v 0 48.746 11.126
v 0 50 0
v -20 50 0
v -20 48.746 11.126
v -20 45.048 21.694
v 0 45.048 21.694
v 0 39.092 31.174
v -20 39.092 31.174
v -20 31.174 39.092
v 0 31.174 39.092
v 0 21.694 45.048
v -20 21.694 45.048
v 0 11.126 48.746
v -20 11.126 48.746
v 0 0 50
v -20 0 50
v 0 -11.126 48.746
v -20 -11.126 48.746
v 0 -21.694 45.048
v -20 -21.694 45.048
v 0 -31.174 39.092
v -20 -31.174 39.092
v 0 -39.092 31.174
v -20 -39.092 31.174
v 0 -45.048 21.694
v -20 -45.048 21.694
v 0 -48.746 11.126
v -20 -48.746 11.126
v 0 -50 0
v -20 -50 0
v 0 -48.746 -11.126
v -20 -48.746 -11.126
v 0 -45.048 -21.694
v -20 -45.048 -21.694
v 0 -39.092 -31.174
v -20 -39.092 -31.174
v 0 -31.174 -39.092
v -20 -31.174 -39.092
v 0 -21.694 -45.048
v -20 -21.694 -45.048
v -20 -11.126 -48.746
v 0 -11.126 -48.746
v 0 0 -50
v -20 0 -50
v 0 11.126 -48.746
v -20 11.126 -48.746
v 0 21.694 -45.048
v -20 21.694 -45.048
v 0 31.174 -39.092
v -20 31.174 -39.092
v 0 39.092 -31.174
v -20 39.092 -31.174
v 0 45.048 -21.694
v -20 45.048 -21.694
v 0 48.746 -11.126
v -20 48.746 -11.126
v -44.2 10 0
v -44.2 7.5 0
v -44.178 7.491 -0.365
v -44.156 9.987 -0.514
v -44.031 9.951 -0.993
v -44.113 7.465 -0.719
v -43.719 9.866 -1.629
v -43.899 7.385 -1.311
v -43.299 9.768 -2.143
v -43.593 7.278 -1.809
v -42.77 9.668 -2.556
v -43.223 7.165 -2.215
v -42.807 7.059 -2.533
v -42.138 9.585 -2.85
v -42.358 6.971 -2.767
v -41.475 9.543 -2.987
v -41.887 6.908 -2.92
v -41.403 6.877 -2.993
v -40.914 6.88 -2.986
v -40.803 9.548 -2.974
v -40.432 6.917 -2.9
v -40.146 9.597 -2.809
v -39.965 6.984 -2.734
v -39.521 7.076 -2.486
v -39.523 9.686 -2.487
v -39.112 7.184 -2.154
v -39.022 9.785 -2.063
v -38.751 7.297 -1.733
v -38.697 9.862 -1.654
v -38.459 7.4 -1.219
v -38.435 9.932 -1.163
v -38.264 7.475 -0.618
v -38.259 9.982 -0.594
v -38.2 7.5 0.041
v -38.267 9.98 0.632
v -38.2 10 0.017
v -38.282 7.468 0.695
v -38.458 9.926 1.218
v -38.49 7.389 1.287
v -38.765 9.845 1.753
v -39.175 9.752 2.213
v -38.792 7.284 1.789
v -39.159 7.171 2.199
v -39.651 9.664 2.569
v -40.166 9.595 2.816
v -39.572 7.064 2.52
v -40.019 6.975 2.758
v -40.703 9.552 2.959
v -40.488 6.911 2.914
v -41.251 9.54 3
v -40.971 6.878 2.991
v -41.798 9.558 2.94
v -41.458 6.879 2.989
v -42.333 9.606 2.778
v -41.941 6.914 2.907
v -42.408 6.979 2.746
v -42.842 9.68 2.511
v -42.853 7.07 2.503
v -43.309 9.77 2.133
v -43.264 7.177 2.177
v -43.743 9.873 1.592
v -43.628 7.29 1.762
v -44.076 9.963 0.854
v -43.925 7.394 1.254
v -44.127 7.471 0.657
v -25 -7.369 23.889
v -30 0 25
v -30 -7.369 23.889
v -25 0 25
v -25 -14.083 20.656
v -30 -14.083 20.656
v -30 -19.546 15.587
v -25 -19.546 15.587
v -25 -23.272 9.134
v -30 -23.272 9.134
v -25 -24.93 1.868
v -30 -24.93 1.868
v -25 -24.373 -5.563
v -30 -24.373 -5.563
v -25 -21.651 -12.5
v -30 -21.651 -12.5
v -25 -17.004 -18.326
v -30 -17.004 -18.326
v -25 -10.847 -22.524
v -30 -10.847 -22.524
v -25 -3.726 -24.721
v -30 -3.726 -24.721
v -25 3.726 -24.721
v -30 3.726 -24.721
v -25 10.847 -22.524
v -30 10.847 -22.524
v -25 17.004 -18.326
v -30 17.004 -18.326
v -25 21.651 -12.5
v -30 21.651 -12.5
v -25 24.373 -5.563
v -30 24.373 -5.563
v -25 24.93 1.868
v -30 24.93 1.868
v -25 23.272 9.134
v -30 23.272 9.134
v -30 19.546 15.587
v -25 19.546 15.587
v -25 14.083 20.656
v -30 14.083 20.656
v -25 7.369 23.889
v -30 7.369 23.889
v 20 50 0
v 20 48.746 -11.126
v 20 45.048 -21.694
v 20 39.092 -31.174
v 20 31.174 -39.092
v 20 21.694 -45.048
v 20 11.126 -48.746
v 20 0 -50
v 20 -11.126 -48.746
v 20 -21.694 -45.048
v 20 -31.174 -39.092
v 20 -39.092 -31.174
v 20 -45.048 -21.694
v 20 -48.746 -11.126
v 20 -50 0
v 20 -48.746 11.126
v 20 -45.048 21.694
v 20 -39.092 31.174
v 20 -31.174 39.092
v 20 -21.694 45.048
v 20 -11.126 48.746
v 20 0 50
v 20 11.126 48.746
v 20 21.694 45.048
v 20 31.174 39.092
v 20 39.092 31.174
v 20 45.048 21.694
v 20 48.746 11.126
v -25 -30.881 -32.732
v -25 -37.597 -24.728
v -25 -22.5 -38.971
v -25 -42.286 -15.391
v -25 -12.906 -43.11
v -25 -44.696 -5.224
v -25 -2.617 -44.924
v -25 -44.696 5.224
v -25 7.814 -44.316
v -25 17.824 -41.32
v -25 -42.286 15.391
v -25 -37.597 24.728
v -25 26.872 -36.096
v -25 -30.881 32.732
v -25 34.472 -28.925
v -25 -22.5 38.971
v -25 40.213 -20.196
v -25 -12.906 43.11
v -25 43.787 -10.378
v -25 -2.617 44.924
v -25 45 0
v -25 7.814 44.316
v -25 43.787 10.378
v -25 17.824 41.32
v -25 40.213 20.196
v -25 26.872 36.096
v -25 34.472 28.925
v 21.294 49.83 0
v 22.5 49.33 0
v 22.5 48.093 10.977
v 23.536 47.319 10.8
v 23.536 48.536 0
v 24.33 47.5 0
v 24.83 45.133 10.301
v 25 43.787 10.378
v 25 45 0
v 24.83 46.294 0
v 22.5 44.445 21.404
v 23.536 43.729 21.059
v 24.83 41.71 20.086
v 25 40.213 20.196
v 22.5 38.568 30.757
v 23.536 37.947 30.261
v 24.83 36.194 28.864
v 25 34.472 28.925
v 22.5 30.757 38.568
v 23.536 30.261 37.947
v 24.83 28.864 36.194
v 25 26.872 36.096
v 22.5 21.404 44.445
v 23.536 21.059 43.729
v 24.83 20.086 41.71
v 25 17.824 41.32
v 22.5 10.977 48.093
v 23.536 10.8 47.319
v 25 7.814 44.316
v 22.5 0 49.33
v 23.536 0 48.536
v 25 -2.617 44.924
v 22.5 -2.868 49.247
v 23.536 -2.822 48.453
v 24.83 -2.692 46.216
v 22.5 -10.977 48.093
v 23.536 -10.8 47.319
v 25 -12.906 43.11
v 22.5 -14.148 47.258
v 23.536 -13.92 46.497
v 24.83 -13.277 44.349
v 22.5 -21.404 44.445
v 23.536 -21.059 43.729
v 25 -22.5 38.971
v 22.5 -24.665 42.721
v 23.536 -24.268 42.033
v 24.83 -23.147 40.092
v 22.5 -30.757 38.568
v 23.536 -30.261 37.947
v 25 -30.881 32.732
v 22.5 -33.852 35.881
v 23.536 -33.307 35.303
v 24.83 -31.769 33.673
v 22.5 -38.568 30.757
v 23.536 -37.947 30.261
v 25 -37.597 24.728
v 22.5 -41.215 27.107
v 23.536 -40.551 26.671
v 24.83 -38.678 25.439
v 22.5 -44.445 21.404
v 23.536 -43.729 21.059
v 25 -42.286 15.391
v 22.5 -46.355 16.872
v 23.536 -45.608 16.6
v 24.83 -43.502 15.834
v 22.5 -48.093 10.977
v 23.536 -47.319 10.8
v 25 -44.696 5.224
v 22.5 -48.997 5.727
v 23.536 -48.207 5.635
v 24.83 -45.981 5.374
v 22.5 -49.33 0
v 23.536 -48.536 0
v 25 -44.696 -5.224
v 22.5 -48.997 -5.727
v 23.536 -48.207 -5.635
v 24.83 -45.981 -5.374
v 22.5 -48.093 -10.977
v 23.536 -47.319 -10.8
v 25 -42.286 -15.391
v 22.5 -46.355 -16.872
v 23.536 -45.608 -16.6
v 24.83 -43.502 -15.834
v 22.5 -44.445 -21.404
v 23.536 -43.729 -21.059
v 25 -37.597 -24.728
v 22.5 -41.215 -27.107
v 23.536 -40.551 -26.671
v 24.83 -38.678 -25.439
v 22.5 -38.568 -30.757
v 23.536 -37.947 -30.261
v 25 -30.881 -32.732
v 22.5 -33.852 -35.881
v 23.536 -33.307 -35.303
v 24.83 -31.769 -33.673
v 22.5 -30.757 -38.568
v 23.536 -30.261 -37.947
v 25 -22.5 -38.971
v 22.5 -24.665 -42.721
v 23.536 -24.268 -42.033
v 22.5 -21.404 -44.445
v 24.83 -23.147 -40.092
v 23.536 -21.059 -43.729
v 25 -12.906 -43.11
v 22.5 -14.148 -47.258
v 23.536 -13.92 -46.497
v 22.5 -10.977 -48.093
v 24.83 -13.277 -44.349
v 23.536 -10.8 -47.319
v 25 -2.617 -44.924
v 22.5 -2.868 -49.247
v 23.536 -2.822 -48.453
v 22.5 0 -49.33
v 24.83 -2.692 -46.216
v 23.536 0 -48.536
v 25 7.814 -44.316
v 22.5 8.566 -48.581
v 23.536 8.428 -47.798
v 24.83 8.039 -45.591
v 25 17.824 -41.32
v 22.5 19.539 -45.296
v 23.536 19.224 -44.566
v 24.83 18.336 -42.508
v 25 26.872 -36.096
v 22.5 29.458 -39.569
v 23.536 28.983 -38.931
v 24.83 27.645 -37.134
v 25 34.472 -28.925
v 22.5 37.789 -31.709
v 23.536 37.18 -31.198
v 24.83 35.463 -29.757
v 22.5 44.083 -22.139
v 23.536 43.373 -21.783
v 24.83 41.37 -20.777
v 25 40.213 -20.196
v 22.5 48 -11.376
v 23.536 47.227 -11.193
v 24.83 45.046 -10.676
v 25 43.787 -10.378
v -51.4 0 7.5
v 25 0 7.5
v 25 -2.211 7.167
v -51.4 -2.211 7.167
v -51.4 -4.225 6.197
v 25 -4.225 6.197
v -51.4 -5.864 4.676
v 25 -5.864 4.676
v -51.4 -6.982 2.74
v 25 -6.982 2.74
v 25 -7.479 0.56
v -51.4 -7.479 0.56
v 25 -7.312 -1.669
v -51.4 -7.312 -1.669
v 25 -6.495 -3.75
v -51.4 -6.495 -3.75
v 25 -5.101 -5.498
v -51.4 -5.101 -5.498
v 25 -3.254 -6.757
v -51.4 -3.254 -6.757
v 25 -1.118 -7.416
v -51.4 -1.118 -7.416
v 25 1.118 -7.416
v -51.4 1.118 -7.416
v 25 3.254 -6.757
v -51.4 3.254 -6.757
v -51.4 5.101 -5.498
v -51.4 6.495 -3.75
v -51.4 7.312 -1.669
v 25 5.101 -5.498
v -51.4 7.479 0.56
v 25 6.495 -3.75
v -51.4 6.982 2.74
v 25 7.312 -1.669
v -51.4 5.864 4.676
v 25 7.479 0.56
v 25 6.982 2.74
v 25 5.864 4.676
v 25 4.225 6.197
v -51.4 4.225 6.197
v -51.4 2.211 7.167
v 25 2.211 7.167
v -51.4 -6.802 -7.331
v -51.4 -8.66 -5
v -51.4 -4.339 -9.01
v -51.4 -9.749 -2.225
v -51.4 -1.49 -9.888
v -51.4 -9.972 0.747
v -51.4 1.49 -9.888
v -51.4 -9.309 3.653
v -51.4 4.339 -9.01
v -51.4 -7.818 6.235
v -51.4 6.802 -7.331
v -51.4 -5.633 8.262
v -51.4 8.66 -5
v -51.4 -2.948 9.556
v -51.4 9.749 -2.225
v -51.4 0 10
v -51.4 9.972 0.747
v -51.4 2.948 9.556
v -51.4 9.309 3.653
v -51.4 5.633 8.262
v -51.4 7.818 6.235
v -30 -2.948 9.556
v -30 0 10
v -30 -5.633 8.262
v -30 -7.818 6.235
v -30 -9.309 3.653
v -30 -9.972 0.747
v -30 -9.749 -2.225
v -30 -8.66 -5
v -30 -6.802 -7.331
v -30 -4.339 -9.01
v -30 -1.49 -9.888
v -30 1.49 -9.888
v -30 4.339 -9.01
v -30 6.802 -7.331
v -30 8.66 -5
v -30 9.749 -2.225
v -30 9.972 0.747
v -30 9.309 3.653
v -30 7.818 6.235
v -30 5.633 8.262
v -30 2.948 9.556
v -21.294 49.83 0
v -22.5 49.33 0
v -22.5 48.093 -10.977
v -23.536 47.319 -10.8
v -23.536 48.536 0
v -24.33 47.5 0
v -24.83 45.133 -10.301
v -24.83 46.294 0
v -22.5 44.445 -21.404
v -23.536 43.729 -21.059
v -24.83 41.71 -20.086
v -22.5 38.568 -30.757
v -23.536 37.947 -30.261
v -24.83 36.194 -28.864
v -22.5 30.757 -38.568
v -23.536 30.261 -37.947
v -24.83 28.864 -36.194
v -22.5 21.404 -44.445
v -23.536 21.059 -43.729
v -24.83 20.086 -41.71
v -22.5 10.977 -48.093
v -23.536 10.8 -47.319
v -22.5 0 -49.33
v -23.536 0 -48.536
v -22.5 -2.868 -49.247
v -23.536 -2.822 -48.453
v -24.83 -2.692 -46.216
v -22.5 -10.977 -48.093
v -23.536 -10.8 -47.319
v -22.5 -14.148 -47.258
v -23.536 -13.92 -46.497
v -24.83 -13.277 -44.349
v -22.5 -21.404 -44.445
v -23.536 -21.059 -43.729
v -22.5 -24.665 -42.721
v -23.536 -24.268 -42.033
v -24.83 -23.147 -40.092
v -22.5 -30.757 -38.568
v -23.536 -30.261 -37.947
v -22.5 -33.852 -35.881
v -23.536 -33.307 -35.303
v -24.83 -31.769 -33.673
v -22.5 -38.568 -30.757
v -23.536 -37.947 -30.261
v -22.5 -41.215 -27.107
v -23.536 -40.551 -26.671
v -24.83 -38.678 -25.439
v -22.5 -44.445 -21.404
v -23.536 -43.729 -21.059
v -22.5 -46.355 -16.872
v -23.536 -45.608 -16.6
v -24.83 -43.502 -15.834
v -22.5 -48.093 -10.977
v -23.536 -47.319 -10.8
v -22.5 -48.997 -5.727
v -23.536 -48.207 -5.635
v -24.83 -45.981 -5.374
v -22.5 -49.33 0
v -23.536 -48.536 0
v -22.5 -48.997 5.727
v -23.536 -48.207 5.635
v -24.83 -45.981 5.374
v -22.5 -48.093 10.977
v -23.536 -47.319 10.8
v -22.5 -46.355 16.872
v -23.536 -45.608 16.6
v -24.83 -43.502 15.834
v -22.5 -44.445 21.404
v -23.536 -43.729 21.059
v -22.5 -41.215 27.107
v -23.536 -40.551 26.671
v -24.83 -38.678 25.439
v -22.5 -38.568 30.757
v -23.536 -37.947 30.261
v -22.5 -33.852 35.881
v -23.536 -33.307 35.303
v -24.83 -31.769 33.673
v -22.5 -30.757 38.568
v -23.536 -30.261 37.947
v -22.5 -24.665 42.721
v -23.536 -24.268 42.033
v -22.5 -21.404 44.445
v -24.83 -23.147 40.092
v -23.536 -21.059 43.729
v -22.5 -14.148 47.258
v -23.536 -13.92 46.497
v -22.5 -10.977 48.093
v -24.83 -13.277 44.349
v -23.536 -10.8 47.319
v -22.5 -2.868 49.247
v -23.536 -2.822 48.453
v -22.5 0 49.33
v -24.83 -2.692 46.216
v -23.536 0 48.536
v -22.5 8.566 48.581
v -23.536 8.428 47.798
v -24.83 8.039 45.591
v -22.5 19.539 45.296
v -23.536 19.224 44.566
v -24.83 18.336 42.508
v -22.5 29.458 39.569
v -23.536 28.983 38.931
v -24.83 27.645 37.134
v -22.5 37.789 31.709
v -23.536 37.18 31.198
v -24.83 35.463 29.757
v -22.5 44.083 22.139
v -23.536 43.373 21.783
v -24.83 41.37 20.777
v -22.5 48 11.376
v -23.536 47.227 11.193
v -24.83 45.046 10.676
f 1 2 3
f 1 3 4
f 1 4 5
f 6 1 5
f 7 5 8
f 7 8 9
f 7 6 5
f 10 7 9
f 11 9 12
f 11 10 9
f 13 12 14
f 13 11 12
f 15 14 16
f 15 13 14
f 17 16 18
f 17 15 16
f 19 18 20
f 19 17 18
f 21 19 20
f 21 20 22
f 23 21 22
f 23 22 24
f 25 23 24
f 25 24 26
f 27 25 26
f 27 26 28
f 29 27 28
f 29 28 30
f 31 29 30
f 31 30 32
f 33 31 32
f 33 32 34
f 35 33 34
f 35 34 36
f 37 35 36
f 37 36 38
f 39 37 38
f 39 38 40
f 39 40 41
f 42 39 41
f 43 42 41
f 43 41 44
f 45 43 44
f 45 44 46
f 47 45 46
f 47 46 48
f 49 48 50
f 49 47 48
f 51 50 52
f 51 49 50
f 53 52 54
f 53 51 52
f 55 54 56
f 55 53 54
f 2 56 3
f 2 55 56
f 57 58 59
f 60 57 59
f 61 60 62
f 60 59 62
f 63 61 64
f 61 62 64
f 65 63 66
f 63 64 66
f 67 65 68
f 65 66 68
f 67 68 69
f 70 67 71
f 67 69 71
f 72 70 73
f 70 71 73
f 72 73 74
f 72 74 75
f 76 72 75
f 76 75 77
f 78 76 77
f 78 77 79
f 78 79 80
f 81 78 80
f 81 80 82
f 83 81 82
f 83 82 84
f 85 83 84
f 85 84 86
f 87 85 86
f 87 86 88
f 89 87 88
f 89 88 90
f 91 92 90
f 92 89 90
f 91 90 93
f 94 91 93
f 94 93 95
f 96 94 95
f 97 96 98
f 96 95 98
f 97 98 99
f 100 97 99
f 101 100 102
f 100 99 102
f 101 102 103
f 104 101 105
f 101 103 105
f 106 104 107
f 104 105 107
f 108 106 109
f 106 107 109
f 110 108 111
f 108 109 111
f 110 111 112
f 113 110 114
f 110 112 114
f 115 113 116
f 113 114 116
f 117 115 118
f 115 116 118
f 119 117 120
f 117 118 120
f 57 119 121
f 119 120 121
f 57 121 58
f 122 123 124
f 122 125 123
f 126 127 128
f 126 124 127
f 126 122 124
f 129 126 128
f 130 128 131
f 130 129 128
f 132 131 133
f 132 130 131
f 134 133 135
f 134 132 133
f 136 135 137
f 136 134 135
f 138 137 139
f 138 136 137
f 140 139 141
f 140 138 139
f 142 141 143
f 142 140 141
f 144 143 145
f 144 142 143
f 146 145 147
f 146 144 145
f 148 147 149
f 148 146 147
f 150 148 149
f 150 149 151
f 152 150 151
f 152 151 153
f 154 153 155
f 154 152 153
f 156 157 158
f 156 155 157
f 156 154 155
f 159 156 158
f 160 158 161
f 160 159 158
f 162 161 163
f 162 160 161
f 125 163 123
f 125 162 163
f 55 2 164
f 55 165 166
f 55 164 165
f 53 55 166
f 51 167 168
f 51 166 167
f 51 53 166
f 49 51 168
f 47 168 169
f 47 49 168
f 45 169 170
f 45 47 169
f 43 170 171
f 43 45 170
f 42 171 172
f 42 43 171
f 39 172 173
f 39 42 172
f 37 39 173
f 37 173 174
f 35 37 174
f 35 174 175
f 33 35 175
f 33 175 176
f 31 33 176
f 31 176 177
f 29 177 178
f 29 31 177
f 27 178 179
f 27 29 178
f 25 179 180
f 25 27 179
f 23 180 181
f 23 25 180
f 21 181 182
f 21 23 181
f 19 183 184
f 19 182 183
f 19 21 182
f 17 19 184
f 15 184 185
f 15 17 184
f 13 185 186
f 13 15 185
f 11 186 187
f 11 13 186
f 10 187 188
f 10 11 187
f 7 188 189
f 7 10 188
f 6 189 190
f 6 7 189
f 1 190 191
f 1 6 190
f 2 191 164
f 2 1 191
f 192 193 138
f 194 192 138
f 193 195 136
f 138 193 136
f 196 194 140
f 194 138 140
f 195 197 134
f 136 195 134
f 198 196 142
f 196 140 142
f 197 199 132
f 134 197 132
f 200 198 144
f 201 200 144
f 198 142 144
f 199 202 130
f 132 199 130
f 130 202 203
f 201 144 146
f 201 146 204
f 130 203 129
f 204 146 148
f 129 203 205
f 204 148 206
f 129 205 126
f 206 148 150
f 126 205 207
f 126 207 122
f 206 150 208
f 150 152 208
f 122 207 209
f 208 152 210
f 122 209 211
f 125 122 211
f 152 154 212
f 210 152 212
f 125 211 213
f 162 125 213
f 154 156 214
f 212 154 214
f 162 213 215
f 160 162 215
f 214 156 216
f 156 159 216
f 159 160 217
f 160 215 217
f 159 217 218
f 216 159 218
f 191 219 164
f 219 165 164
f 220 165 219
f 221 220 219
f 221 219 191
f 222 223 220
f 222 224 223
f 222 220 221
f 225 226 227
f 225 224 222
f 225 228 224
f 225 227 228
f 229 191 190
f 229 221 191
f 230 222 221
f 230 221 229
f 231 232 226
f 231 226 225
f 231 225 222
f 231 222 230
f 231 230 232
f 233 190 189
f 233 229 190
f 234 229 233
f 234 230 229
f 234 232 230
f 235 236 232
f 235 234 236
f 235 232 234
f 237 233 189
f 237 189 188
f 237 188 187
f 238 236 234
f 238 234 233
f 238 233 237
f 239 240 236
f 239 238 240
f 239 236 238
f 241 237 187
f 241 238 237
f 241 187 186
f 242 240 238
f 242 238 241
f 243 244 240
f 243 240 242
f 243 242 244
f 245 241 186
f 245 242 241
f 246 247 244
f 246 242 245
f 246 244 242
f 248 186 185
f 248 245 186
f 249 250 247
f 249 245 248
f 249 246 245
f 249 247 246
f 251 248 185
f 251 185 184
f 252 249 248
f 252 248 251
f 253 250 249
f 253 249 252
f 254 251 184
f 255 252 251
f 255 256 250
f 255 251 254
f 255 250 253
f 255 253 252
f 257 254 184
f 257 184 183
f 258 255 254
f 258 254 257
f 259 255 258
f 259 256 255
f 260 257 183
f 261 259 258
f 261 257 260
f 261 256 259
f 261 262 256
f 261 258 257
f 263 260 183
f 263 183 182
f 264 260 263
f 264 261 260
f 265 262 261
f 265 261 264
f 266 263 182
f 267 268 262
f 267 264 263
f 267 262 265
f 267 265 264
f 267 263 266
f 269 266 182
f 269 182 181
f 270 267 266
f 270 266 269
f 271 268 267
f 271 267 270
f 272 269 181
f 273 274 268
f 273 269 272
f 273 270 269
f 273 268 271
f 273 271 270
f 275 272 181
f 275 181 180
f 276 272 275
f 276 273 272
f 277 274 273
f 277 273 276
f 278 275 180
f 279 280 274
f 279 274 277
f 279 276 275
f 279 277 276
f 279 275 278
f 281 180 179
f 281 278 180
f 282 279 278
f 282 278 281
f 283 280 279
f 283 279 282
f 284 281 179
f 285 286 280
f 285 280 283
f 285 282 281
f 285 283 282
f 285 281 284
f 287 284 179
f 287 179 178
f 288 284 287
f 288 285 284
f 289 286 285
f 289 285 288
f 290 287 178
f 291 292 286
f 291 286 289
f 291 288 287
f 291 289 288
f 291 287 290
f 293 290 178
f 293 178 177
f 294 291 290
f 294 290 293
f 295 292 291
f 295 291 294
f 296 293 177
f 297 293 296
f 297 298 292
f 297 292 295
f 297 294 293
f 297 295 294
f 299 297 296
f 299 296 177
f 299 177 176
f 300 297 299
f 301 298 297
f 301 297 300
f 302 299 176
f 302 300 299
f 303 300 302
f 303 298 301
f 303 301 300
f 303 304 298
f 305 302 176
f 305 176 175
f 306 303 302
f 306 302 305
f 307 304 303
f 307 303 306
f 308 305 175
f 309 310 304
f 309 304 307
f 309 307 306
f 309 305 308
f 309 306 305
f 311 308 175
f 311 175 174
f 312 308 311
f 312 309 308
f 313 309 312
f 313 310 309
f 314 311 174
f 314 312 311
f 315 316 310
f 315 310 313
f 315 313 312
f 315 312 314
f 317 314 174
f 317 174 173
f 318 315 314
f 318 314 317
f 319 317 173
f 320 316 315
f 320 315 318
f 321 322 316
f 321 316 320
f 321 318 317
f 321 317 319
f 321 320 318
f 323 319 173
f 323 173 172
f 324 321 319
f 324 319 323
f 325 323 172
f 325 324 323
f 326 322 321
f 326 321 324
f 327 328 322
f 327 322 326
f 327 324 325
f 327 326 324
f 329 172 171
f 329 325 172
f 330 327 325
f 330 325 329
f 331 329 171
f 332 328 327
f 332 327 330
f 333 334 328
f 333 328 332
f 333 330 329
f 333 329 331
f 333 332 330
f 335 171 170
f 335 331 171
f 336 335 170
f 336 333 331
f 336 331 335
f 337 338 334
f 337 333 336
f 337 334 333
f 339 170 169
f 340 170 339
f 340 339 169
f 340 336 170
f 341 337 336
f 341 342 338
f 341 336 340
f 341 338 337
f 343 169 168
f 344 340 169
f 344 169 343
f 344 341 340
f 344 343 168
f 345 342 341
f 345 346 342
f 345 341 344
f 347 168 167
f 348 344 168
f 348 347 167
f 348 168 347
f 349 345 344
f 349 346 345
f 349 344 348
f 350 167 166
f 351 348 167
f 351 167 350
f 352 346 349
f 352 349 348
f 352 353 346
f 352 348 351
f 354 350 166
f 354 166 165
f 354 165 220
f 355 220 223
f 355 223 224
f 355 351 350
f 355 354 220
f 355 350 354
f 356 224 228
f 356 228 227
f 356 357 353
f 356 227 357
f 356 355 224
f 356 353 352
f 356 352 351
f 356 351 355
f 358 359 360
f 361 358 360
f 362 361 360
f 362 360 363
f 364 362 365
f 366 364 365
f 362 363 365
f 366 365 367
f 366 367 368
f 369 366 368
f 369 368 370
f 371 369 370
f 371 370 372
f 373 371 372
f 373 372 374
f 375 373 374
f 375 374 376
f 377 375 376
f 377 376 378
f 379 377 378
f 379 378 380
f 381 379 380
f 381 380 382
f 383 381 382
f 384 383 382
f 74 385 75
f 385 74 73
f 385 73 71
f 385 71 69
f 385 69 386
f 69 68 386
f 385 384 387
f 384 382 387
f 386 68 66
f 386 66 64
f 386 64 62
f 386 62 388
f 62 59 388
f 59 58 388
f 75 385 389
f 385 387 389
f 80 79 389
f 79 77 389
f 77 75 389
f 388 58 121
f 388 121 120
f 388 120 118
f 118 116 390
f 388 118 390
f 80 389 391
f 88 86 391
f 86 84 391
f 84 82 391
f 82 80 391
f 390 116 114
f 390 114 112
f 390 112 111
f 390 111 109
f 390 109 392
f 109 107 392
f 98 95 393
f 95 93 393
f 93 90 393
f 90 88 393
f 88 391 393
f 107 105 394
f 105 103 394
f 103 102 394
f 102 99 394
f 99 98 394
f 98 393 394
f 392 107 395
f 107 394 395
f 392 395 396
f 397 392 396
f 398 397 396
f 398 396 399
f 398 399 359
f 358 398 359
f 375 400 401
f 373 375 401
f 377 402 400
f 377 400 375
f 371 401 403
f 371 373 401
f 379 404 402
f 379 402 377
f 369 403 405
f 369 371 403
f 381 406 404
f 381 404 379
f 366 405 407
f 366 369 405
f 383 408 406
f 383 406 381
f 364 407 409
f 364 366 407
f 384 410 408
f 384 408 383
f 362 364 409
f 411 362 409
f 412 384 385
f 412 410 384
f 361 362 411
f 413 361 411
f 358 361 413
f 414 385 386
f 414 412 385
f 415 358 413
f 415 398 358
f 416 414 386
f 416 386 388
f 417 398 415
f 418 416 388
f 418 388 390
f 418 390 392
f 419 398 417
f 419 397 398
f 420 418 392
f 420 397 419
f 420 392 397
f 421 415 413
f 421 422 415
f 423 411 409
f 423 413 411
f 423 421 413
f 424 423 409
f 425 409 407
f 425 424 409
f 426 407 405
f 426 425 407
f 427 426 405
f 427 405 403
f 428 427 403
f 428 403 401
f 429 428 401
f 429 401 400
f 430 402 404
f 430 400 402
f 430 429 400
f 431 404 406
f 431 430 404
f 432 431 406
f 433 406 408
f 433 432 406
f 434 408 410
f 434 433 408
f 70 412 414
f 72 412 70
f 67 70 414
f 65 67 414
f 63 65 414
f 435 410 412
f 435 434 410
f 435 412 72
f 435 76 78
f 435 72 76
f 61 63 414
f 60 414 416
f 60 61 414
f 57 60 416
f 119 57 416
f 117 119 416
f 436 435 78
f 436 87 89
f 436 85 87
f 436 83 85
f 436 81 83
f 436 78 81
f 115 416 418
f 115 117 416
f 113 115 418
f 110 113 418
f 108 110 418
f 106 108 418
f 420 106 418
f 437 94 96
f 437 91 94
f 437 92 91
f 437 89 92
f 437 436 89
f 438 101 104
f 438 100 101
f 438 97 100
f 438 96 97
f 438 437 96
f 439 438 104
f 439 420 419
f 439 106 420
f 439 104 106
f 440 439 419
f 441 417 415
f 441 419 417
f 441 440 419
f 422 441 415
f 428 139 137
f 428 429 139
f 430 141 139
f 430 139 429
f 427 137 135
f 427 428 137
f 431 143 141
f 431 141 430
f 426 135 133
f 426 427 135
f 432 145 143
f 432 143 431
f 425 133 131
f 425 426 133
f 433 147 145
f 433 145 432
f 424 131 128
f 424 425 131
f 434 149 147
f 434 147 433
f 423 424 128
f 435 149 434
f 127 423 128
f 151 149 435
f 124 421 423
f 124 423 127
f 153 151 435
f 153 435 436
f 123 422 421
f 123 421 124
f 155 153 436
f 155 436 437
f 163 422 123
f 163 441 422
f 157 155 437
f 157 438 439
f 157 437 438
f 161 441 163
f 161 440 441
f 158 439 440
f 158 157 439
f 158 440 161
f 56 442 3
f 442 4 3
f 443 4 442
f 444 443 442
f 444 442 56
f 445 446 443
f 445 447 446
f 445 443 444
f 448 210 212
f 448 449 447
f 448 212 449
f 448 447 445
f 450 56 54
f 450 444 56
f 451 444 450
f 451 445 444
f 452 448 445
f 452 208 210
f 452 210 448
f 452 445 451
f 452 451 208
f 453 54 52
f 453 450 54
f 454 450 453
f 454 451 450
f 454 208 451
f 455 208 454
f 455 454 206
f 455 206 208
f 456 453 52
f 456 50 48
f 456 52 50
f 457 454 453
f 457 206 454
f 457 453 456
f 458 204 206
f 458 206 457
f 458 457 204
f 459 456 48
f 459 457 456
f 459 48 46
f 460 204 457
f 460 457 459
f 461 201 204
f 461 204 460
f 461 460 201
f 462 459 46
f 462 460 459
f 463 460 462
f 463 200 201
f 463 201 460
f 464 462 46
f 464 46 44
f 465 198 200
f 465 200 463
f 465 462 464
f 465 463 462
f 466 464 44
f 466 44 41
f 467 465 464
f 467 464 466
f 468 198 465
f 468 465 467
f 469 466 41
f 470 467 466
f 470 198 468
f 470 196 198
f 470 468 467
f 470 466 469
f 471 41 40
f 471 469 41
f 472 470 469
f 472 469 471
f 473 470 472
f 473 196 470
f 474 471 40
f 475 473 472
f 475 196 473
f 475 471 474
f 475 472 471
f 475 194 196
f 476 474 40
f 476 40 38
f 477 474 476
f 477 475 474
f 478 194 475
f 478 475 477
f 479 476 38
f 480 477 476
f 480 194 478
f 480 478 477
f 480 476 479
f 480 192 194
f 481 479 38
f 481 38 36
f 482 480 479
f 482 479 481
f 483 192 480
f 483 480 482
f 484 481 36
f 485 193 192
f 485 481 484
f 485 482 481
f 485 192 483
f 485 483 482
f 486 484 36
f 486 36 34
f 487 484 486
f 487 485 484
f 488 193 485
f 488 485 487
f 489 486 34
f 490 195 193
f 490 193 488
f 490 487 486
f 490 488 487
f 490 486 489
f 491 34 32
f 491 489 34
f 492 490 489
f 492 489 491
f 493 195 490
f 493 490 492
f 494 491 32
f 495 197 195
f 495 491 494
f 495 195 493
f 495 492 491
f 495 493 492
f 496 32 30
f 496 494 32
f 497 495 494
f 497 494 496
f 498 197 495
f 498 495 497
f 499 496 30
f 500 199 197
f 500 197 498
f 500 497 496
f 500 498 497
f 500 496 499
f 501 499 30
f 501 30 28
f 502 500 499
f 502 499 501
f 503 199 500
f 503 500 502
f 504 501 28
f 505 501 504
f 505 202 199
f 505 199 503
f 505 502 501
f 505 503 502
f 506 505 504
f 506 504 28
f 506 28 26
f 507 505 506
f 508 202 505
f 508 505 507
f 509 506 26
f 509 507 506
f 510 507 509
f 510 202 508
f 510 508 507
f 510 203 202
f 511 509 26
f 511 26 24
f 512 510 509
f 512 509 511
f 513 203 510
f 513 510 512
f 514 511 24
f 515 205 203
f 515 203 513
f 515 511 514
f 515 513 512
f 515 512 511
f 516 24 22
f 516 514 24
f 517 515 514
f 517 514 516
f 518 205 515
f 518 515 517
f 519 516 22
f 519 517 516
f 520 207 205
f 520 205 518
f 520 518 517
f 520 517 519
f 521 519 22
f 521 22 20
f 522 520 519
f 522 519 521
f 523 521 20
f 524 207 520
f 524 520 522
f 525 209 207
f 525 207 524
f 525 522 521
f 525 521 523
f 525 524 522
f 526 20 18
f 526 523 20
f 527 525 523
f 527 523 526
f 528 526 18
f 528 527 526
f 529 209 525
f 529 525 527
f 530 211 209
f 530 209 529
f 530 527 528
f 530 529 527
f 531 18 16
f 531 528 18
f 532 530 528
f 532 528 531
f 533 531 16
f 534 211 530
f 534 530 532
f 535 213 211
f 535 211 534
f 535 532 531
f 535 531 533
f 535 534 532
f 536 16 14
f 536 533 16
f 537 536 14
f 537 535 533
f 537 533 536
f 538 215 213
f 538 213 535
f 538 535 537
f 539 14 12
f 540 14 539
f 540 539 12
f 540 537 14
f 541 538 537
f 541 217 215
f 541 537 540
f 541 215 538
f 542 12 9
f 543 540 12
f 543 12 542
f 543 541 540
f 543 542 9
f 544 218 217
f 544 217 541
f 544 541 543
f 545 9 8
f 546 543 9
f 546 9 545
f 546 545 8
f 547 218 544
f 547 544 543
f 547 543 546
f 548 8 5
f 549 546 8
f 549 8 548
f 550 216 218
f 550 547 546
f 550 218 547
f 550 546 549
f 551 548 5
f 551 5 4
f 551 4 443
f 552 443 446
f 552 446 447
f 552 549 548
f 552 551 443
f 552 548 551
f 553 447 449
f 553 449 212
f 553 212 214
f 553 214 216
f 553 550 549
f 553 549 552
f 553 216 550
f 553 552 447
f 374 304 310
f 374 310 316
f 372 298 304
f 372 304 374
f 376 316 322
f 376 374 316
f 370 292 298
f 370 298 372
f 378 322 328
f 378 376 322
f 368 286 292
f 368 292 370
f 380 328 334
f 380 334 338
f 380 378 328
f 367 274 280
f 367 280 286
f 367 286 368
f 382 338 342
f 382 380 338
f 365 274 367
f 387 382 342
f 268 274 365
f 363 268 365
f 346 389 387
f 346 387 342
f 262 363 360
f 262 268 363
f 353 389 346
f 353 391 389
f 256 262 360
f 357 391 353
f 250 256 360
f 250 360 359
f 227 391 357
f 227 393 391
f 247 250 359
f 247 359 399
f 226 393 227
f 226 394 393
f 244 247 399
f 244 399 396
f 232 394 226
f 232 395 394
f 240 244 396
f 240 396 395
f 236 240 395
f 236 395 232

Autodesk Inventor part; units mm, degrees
ref_plane "YZ Plane" through (0, 0, 0) normal (1, 0, 0) x (0, 1, 0)
ref_plane "XZ Plane" through (0, 0, 0) normal (0, 1, 0) x (-1, 0, 0)
ref_plane "XY Plane" through (0, 0, 0) normal (0, 0, 1) x (1, 0, 0)
sketch "Sketch1" plane through (0, 0, 0) normal (1, 0, 0) x (0, 1, 0)
  circle A0 centre (0, 0) radius 50
  dimension "d0" = 100
extrude "Extrusion1" add sketch "Sketch1" along normal mid plane 50
fillet "Fillet1" radius 5 2 edges at (-25, -50, 0) (25, -50, 0)
sketch "Sketch3" plane through (-25, 0, 0) normal (-1, 0, 0) x (0, 0, 1)
  circle A0 centre (0, 0) radius 25
  dimension "d11" = 50
extrude "Extrusion2" add sketch "Sketch3" along normal blind 5
sketch "Sketch4" plane through (-30, 0, 0) normal (-1, 0, 0) x (0, 0, 1)
  circle A0 centre (0, 0) radius 10
  dimension "d14" = 20
extrude "Extrusion3" add sketch "Sketch4" along normal blind 21.4
sketch "Sketch5" plane through (-51.4, 0, 0) normal (-1, 0, 0) x (0, 0, 1)
  circle A0 centre (0, 0) radius 50 projected
hole "Hole2" at (-51.4, 0, 0) direction (1, 0, 0) diameter 15 end through all
sketch "Sketch6" plane through (0, 0, 0) normal (0, 1, 0) x (-1, 0, 0)
  circle A0 centre (41.2, 0) radius 3
  line L0 (51.4, -10) -> (51.4, 10) projected
  line L1 (41.2, 0) -> (51.4, 0) construction
  point P0 (0, 0)
  dimension "d24" = 6
  dimension "d25" = 10.2
extrude "Extrusion4" cut sketch "Sketch6" along normal blind 21.4
thread "Thread1" size "M6x1" class "6H" standard "ANSI Metric M Profile" full length
properties part number "100mm Mecanum StandIn" material "Rubber"
